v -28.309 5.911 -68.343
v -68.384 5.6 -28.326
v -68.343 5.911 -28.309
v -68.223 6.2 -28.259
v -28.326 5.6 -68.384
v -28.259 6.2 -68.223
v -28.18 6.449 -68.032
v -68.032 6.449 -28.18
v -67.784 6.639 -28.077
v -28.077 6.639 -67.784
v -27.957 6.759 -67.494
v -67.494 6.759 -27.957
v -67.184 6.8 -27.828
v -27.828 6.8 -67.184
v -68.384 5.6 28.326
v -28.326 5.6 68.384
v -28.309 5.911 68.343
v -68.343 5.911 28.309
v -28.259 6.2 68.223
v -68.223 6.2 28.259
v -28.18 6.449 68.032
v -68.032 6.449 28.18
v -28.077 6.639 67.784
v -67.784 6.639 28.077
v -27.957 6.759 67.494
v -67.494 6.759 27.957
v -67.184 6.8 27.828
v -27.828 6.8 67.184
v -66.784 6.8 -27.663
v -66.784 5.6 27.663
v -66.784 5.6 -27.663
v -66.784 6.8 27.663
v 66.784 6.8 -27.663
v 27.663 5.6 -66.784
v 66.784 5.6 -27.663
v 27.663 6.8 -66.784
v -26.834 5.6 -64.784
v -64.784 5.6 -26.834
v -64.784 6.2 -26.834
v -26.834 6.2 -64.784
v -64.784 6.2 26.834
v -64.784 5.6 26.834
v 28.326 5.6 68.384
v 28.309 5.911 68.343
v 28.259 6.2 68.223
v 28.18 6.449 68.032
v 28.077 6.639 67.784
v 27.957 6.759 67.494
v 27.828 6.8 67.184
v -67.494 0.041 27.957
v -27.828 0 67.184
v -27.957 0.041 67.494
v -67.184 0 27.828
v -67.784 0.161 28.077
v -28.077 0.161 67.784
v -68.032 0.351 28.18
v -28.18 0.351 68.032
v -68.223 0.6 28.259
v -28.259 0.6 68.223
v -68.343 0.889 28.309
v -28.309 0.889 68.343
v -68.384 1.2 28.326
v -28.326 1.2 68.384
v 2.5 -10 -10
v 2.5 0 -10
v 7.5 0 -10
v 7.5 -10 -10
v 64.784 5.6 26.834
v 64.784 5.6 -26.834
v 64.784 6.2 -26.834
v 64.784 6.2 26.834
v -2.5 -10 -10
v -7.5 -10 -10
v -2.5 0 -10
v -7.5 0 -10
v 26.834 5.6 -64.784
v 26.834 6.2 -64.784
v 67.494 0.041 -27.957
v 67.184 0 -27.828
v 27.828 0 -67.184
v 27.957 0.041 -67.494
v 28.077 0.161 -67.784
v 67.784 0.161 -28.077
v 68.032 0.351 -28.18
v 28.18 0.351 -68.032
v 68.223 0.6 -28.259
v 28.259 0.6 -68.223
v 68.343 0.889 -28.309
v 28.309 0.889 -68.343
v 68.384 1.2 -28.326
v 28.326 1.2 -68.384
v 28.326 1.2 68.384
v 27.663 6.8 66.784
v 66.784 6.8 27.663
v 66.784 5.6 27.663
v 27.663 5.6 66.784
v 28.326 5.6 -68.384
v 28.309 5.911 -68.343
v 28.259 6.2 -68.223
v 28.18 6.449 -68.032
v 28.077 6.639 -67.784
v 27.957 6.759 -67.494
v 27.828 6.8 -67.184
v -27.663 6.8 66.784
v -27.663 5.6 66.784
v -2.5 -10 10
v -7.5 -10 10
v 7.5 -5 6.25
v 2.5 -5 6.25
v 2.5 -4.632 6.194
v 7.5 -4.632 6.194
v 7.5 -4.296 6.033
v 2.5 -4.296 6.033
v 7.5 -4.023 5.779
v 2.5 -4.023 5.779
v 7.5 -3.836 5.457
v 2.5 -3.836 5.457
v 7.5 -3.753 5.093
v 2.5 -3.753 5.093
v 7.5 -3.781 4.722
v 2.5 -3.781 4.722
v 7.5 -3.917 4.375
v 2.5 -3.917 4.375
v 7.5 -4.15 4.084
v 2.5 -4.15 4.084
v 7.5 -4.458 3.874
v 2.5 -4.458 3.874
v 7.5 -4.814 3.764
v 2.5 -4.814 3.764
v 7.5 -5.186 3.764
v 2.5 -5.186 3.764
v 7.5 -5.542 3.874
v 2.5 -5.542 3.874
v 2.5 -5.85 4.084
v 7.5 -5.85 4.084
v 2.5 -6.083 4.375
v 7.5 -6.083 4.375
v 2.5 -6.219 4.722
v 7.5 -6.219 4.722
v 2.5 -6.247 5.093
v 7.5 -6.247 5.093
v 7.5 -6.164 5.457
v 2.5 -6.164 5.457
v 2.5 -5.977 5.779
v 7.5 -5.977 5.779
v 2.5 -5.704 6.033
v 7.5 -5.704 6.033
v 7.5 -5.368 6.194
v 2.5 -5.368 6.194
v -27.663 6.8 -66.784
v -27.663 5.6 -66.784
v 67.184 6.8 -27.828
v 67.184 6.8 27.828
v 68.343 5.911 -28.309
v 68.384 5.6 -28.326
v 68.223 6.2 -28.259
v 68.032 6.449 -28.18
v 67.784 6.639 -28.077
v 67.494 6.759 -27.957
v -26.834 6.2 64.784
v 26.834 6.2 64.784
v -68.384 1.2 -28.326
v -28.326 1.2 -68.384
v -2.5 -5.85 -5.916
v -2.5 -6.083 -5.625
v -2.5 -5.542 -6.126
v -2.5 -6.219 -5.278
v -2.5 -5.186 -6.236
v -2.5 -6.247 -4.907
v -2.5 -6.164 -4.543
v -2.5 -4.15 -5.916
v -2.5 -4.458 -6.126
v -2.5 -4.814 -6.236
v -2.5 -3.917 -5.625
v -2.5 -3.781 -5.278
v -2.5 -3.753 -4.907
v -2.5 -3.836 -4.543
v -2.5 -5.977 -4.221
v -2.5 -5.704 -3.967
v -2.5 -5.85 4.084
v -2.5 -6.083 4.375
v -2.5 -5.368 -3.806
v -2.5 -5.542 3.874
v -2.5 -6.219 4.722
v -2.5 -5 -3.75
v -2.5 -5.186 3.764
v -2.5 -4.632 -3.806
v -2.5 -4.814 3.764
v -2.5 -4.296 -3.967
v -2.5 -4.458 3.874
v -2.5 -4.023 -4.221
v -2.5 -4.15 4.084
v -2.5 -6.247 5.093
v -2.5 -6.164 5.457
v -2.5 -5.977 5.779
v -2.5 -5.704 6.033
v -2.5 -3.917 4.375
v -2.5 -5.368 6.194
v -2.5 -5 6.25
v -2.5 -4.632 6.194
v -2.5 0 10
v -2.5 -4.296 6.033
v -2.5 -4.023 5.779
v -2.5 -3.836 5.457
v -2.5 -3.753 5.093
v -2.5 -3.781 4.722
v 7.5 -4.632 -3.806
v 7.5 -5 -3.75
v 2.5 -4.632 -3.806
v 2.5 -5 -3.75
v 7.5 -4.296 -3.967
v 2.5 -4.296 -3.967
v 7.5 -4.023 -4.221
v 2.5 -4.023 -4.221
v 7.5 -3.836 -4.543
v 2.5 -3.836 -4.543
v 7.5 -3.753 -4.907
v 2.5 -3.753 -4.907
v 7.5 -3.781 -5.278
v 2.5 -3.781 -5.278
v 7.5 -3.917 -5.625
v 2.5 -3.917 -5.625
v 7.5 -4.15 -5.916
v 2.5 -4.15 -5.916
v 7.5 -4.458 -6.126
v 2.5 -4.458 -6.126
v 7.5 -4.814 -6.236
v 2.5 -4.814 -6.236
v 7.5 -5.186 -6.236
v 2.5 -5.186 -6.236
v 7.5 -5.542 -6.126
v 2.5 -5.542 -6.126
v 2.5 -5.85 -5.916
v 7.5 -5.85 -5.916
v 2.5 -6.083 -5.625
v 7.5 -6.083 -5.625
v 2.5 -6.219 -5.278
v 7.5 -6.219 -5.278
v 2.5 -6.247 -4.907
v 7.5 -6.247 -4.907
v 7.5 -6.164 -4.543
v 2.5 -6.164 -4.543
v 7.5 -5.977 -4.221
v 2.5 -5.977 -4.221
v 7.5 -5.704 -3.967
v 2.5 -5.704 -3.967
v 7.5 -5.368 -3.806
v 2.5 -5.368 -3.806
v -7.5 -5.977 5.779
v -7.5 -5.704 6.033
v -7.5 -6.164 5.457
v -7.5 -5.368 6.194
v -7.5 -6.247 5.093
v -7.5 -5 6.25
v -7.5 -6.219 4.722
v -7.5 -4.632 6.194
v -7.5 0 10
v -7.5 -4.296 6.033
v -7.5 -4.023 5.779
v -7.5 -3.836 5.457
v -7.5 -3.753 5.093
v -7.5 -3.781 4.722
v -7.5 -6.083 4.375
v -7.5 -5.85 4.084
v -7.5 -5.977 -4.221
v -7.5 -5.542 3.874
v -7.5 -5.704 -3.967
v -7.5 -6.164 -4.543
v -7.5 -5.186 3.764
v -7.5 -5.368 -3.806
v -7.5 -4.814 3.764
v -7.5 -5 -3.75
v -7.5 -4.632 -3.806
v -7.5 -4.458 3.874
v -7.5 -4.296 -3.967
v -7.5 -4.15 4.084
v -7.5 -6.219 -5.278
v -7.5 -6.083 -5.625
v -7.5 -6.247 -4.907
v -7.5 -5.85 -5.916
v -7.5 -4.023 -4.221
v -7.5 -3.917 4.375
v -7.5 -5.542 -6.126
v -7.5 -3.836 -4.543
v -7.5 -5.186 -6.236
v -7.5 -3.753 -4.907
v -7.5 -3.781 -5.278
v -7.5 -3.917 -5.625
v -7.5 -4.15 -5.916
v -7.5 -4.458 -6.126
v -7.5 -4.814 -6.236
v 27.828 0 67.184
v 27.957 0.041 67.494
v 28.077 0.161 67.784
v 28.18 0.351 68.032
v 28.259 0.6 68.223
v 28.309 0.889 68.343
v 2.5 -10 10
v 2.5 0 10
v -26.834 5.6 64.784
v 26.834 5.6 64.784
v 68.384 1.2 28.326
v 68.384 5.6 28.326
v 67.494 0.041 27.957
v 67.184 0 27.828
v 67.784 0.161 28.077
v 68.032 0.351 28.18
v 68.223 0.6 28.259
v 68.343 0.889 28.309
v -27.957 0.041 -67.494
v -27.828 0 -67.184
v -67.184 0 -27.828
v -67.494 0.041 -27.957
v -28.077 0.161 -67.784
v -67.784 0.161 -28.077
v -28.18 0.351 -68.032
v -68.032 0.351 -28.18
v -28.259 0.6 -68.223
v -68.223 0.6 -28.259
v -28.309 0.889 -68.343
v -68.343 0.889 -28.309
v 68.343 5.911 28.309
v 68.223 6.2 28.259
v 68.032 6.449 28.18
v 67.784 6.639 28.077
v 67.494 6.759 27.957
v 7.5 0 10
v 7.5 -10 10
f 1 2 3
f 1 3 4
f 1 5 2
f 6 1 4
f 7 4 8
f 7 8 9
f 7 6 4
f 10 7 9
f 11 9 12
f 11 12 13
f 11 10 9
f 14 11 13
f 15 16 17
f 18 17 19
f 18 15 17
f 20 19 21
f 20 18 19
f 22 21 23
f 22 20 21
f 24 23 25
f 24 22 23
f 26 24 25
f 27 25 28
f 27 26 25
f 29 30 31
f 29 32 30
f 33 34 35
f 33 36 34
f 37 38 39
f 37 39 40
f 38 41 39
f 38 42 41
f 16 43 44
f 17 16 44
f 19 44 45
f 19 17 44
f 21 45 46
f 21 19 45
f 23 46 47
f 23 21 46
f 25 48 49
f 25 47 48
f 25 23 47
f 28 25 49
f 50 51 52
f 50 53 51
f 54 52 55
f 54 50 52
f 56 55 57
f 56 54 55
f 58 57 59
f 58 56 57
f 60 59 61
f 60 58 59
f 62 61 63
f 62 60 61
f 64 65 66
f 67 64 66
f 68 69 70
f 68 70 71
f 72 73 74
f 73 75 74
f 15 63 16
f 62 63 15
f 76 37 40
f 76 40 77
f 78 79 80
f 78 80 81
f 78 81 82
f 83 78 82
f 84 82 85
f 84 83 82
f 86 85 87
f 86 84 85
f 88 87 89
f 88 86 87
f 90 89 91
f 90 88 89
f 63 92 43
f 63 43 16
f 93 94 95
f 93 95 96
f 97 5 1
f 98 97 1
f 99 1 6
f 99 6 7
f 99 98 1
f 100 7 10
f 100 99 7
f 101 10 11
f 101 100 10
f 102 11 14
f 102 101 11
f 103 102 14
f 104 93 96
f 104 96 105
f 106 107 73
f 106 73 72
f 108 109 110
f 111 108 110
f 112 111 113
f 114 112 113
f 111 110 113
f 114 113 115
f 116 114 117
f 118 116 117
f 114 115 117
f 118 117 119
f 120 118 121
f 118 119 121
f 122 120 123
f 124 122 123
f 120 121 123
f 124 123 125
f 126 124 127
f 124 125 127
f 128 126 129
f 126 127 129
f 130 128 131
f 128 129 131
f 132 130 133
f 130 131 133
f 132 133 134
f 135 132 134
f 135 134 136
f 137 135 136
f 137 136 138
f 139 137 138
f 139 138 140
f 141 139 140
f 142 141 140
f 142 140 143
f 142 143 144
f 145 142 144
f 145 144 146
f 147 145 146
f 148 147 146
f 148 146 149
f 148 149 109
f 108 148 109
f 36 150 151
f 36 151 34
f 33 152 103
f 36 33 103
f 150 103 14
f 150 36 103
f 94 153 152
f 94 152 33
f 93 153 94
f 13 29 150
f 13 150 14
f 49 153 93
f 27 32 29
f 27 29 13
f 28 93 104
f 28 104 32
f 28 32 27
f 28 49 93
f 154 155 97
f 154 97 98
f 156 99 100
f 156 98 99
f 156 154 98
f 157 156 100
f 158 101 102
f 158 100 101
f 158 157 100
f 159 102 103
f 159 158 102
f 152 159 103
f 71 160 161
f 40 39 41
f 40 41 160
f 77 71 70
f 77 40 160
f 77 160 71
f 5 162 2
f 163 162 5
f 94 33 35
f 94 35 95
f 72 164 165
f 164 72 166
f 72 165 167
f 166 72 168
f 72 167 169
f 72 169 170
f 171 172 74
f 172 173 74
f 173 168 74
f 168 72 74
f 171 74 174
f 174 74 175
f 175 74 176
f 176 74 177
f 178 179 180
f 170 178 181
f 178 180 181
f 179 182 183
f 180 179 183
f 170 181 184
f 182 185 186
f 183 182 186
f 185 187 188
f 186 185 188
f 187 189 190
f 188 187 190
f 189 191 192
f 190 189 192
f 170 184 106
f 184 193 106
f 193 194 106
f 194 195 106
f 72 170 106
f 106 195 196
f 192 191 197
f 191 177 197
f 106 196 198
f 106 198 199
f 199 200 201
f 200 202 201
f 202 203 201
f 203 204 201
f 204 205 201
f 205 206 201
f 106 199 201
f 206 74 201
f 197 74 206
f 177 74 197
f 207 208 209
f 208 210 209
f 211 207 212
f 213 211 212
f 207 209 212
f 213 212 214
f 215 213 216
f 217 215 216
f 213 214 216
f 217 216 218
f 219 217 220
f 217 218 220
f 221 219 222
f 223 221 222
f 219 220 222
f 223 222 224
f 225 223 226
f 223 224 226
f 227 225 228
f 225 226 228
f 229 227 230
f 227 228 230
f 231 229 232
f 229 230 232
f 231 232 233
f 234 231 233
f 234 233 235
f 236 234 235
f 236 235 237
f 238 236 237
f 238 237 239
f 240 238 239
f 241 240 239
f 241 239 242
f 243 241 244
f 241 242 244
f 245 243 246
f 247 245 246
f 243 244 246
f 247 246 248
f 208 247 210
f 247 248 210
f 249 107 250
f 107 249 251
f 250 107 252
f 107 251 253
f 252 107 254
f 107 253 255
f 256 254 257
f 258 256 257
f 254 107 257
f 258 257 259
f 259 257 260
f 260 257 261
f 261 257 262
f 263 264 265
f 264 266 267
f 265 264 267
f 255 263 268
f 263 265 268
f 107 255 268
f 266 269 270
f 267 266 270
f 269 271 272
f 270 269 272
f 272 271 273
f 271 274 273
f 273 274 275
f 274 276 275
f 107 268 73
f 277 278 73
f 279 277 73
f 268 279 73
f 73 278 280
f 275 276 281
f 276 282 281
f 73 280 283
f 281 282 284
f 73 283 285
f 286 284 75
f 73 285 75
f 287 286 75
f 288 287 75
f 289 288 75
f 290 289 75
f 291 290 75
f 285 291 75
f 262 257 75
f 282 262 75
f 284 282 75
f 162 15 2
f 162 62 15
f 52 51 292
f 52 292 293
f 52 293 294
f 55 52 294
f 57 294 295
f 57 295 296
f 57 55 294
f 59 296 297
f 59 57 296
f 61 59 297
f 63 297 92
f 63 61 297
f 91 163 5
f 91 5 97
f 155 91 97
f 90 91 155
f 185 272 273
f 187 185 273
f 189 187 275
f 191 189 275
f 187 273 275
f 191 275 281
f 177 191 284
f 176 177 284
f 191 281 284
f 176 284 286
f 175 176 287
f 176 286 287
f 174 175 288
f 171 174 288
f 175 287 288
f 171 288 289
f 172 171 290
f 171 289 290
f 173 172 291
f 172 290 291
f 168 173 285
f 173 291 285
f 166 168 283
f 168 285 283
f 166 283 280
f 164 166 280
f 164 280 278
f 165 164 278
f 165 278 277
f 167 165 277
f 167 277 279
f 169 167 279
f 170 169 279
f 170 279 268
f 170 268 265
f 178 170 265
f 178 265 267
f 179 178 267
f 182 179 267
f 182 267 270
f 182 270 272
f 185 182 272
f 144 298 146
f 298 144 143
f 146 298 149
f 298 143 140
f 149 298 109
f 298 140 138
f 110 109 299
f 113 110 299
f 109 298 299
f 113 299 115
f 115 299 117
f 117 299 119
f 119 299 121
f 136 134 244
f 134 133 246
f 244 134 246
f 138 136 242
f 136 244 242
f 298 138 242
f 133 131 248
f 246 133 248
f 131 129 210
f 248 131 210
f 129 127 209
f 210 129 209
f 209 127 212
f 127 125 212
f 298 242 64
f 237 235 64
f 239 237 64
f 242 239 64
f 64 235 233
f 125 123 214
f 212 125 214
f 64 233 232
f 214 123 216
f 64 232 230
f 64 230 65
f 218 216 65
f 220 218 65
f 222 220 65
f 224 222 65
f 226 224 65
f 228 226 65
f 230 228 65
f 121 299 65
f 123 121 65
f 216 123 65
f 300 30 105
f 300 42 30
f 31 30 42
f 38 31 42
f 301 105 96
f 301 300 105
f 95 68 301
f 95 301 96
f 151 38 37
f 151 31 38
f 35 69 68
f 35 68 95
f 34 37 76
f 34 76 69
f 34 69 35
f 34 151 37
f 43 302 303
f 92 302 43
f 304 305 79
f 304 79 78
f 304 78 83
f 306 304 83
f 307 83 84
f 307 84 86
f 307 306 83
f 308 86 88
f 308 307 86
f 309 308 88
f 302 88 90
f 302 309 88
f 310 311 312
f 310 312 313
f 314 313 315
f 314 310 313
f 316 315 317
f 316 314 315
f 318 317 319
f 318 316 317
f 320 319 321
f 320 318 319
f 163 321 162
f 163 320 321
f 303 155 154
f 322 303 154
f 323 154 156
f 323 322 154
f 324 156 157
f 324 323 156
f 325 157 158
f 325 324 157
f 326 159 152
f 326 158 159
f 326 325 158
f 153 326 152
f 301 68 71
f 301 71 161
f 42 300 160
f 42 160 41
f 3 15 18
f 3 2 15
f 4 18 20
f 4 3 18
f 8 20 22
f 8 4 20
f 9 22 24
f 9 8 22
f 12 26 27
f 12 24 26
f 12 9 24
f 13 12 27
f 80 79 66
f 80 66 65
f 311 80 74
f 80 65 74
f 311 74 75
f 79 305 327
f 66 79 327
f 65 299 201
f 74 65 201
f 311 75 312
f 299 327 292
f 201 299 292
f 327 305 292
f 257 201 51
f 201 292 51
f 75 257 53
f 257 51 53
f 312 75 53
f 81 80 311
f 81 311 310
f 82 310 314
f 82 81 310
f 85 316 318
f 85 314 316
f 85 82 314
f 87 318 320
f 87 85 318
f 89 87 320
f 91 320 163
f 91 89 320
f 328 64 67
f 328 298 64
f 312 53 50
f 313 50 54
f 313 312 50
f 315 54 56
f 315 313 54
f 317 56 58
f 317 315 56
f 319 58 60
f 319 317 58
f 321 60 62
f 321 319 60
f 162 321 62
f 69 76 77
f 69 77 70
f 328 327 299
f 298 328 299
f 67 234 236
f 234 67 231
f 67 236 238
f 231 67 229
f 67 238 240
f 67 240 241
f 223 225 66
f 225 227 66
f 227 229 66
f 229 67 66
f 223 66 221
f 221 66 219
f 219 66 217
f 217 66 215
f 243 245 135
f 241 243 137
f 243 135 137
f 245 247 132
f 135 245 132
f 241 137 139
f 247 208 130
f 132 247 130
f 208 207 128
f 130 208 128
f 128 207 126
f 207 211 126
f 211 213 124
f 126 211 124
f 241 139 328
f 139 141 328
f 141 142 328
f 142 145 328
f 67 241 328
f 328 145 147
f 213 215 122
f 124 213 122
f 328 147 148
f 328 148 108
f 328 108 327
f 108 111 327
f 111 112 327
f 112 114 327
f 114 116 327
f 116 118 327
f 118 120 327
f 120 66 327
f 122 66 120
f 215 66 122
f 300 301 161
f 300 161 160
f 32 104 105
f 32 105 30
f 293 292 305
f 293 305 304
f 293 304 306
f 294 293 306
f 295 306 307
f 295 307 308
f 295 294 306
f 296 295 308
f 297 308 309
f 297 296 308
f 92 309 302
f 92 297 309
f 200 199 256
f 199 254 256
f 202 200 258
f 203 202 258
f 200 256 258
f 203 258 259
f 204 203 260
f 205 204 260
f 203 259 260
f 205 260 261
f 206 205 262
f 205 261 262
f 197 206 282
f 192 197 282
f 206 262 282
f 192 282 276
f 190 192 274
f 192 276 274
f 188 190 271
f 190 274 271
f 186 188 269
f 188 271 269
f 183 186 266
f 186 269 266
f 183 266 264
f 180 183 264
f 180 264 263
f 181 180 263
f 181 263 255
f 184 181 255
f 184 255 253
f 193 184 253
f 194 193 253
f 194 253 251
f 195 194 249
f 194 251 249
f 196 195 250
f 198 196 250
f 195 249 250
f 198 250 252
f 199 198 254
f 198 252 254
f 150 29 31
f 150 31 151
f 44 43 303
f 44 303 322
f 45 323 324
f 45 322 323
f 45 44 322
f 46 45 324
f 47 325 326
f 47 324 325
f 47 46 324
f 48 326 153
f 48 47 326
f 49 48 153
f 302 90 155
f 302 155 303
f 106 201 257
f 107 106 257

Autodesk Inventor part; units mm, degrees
ref_plane "YZ Plane" through (0, 0, 0) normal (1, 0, 0) x (0, 1, 0)
ref_plane "XZ Plane" through (0, 0, 0) normal (0, 1, 0) x (-1, 0, 0)
ref_plane "XY Plane" through (0, 0, 0) normal (0, 0, 1) x (1, 0, 0)
sketch "스케치3" plane through (0, 0, 0) normal (0, 1, 0) x (-1, 0, 0)
  line L0 (68.3838, -28.3255) -> (28.3255, -68.3838)
  line L1 (28.3255, -68.3838) -> (-28.3255, -68.3838)
  line L2 (-28.3255, -68.3838) -> (-68.3838, -28.3255)
  line L3 (-68.3838, -28.3255) -> (-68.3838, 28.3255)
  line L4 (-68.3838, 28.3255) -> (-28.3255, 68.3838)
  line L5 (-28.3255, 68.3838) -> (28.3255, 68.3838)
  line L6 (28.3255, 68.3838) -> (68.3838, 28.3255)
  line L7 (68.3838, 28.3255) -> (68.3838, -28.3255)
  line L8 (27, -65.1838) -> (-27, -65.1838)
  line L9 (-27, -65.1838) -> (-65.1838, -27)
  line L10 (-65.1838, -27) -> (-65.1838, 27)
  line L11 (-65.1838, 27) -> (-27, 65.1838)
  line L12 (-27, 65.1838) -> (27, 65.1838)
  line L13 (27, 65.1838) -> (65.1838, 27)
  line L14 (65.1838, 27) -> (65.1838, -27)
  line L15 (65.1838, -27) -> (27, -65.1838)
  point P0 (0, 0)
  point P1 (0, 0)
  point P2 (0, 0)
  point P3 (0, 0)
  dimension "d66" = 54
  dimension "d67" = 3.2
extrude "돌출2" add sketch "스케치3" along normal blind 6.8 contours L0 L1 L2 L3 L4 L5 L6 L7 | L8 L9 L10 L11 L12 L13 L14 L15
sketch "스케치4" plane through (0, 6.8, 0) normal (0, 1, 0) x (1, 0, 0)
  line L0 (26.9172, -64.9838) -> (-26.9172, -64.9838)
  line L1 (-26.9172, -64.9838) -> (-64.9838, -26.9172)
  line L2 (-64.9838, -26.9172) -> (-64.9838, 26.9172)
  line L3 (-64.9838, 26.9172) -> (-26.9172, 64.9838)
  line L4 (-26.9172, 64.9838) -> (26.9172, 64.9838)
  line L5 (26.9172, 64.9838) -> (64.9838, 26.9172)
  line L6 (64.9838, 26.9172) -> (64.9838, -26.9172)
  line L7 (64.9838, -26.9172) -> (26.9172, -64.9838)
  line L8 (-27.6627, 66.7838) -> (27.6627, 66.7838)
  line L9 (27.6627, 66.7838) -> (66.7838, 27.6627)
  line L10 (66.7838, 27.6627) -> (66.7838, -27.6627)
  line L11 (66.7838, -27.6627) -> (27.6627, -66.7838)
  line L12 (27.6627, -66.7838) -> (-27.6627, -66.7838)
  line L13 (-27.6627, -66.7838) -> (-66.7838, -27.6627)
  line L14 (-66.7838, -27.6627) -> (-66.7838, 27.6627)
  line L15 (-66.7838, 27.6627) -> (-27.6627, 66.7838)
  line L16 (-26.8343, 64.7838) -> (26.8343, 64.7838)
  line L17 (26.8343, 64.7838) -> (64.7838, 26.8343)
  line L18 (64.7838, 26.8343) -> (64.7838, -26.8343)
  line L19 (64.7838, -26.8343) -> (26.8343, -64.7838)
  line L20 (26.8343, -64.7838) -> (-26.8343, -64.7838)
  line L21 (-26.8343, -64.7838) -> (-64.7838, -26.8343)
  line L22 (-64.7838, -26.8343) -> (-64.7838, 26.8343)
  line L23 (-64.7838, 26.8343) -> (-26.8343, 64.7838)
  line L24 (-68.3838, 28.3255) -> (-68.3838, -28.3255) projected
  point P0 (0, 0)
  point P1 (0, 0)
  point P2 (0, 0)
  point P3 (0, 0)
  dimension "d68" = 1.8
  dimension "d69" = 0.2
  dimension "d99" = 1.6
extrude "돌출3" cut sketch "스케치4" against normal blind 1.2 contours L0 L1 L2 L3 L4 L5 L6 L7 | L8 L9 L10 L11 L12 L13 L14 L15 | L16 L17 L18 L19 L20 L21 L22 L23
sketch "스케치9" plane through (0, 0, 0) normal (0, -1, 0) x (1, 0, 0)
  line L0 (7.5, 10) -> (2.5, 10)
  line L1 (2.5, 10) -> (2.5, -10)
  line L2 (2.5, -10) -> (7.5, -10)
  line L3 (7.5, -10) -> (7.5, 10)
  line L4 (7.5, 10) -> (2.5, -10) construction
  line L5 (2.5, 10) -> (7.5, -10) construction
  line L6 (-2.5, 10) -> (-7.5, 10)
  line L7 (-7.5, 10) -> (-7.5, -10)
  line L8 (-7.5, -10) -> (-2.5, -10)
  line L9 (-2.5, 10) -> (-7.5, -10) construction
  line L10 (-7.5, 10) -> (-2.5, -10) construction
  line L11 (-2.5, -10) -> (-2.5, 10)
  point P0 (0, 0)
  point P1 (5, 0)
  point P2 (-5, 0)
  dimension "d42" = 20
  dimension "d43" = 5
  dimension "d44" = 2.5
  dimension "d47" = 10
extrude "돌출8" add sketch "스케치9" along normal blind 10
sketch "스케치10" plane through (-7.5, 0, -10) normal (-1, 0, 0) x (0, 0, 1)
  circle A0 centre (15, -5) radius 1.25
  line L0 (19.9591, 0) -> (0.0886, 0)
  line L1 (38.3255, 0) -> (-18.3255, 0) projected
  circle A1 centre (5, -5) radius 1.25
  line L2 (20, 0) -> (20, -10) projected
  point P0 (10, 0)
  dimension "d54" = 2.5
  dimension "d57" = 10
  dimension "d62" = 5
  dimension "d63" = 5
extrude "돌출9" cut sketch "스케치10" against normal blind 20
sketch "스케치11" plane through (0, 5.6, 0) normal (0, 1, 0) x (1, 0, 0)
  line L0 (-26.8343, 64.7838) -> (26.8343, 64.7838)
  line L1 (26.8343, 64.7838) -> (64.7838, 26.8343)
  line L2 (64.7838, 26.8343) -> (64.7838, -26.8343)
  line L3 (64.7838, -26.8343) -> (26.8343, -64.7838)
  line L4 (26.8343, -64.7838) -> (-26.8343, -64.7838)
  line L5 (-26.8343, -64.7838) -> (-64.7838, -26.8343)
  line L6 (-64.7838, -26.8343) -> (-64.7838, 26.8343)
  line L7 (-64.7838, 26.8343) -> (-26.8343, 64.7838)
  line L8 (-27.6627, 66.7838) -> (27.6627, 66.7838) projected
  line L9 (-25.5917, 61.7838) -> (25.5917, 61.7838)
  line L10 (25.5917, 61.7838) -> (61.7838, 25.5917)
  line L11 (61.7838, 25.5917) -> (61.7838, -25.5917)
  line L12 (61.7838, -25.5917) -> (25.5917, -61.7838)
  line L13 (25.5917, -61.7838) -> (-25.5917, -61.7838)
  line L14 (-25.5917, -61.7838) -> (-61.7838, -25.5917)
  line L15 (-61.7838, -25.5917) -> (-61.7838, 25.5917)
  line L16 (-61.7838, 25.5917) -> (-25.5917, 61.7838)
  point P0 (0, 0)
  point P1 (0, 0)
  point P2 (0, 0)
  dimension "d70" = 2
  dimension "d71" = 3
extrude "돌출10" add sketch "스케치11" along normal blind 0.6 contours L0 L1 L2 L3 L4 L5 L6 L7 | L9 L10 L11 L12 L13 L14 L15 L16
fillet "모깎기1" radius 1.2 16 edges at (-48.3546, 6.8, 48.3546) (0, 6.8, 68.3838) (48.3546, 6.8, 48.3546) (68.3838, 6.8, 0) (48.3546, 6.8, -48.3546) (0, 6.8, -68.3838) (-48.3546, 6.8, -48.3546) (-68.3838, 6.8, 0) (-48.3546, 0, 48.3546) (0, 0, 68.3838) (48.3546, 0, 48.3546) (68.3838, 0, 0) (48.3546, 0, -48.3546) (0, 0, -68.3838) (-48.3546, 0, -48.3546) (-68.3838, 0, 0)
properties part number "OV-PAM_bottom_2"
